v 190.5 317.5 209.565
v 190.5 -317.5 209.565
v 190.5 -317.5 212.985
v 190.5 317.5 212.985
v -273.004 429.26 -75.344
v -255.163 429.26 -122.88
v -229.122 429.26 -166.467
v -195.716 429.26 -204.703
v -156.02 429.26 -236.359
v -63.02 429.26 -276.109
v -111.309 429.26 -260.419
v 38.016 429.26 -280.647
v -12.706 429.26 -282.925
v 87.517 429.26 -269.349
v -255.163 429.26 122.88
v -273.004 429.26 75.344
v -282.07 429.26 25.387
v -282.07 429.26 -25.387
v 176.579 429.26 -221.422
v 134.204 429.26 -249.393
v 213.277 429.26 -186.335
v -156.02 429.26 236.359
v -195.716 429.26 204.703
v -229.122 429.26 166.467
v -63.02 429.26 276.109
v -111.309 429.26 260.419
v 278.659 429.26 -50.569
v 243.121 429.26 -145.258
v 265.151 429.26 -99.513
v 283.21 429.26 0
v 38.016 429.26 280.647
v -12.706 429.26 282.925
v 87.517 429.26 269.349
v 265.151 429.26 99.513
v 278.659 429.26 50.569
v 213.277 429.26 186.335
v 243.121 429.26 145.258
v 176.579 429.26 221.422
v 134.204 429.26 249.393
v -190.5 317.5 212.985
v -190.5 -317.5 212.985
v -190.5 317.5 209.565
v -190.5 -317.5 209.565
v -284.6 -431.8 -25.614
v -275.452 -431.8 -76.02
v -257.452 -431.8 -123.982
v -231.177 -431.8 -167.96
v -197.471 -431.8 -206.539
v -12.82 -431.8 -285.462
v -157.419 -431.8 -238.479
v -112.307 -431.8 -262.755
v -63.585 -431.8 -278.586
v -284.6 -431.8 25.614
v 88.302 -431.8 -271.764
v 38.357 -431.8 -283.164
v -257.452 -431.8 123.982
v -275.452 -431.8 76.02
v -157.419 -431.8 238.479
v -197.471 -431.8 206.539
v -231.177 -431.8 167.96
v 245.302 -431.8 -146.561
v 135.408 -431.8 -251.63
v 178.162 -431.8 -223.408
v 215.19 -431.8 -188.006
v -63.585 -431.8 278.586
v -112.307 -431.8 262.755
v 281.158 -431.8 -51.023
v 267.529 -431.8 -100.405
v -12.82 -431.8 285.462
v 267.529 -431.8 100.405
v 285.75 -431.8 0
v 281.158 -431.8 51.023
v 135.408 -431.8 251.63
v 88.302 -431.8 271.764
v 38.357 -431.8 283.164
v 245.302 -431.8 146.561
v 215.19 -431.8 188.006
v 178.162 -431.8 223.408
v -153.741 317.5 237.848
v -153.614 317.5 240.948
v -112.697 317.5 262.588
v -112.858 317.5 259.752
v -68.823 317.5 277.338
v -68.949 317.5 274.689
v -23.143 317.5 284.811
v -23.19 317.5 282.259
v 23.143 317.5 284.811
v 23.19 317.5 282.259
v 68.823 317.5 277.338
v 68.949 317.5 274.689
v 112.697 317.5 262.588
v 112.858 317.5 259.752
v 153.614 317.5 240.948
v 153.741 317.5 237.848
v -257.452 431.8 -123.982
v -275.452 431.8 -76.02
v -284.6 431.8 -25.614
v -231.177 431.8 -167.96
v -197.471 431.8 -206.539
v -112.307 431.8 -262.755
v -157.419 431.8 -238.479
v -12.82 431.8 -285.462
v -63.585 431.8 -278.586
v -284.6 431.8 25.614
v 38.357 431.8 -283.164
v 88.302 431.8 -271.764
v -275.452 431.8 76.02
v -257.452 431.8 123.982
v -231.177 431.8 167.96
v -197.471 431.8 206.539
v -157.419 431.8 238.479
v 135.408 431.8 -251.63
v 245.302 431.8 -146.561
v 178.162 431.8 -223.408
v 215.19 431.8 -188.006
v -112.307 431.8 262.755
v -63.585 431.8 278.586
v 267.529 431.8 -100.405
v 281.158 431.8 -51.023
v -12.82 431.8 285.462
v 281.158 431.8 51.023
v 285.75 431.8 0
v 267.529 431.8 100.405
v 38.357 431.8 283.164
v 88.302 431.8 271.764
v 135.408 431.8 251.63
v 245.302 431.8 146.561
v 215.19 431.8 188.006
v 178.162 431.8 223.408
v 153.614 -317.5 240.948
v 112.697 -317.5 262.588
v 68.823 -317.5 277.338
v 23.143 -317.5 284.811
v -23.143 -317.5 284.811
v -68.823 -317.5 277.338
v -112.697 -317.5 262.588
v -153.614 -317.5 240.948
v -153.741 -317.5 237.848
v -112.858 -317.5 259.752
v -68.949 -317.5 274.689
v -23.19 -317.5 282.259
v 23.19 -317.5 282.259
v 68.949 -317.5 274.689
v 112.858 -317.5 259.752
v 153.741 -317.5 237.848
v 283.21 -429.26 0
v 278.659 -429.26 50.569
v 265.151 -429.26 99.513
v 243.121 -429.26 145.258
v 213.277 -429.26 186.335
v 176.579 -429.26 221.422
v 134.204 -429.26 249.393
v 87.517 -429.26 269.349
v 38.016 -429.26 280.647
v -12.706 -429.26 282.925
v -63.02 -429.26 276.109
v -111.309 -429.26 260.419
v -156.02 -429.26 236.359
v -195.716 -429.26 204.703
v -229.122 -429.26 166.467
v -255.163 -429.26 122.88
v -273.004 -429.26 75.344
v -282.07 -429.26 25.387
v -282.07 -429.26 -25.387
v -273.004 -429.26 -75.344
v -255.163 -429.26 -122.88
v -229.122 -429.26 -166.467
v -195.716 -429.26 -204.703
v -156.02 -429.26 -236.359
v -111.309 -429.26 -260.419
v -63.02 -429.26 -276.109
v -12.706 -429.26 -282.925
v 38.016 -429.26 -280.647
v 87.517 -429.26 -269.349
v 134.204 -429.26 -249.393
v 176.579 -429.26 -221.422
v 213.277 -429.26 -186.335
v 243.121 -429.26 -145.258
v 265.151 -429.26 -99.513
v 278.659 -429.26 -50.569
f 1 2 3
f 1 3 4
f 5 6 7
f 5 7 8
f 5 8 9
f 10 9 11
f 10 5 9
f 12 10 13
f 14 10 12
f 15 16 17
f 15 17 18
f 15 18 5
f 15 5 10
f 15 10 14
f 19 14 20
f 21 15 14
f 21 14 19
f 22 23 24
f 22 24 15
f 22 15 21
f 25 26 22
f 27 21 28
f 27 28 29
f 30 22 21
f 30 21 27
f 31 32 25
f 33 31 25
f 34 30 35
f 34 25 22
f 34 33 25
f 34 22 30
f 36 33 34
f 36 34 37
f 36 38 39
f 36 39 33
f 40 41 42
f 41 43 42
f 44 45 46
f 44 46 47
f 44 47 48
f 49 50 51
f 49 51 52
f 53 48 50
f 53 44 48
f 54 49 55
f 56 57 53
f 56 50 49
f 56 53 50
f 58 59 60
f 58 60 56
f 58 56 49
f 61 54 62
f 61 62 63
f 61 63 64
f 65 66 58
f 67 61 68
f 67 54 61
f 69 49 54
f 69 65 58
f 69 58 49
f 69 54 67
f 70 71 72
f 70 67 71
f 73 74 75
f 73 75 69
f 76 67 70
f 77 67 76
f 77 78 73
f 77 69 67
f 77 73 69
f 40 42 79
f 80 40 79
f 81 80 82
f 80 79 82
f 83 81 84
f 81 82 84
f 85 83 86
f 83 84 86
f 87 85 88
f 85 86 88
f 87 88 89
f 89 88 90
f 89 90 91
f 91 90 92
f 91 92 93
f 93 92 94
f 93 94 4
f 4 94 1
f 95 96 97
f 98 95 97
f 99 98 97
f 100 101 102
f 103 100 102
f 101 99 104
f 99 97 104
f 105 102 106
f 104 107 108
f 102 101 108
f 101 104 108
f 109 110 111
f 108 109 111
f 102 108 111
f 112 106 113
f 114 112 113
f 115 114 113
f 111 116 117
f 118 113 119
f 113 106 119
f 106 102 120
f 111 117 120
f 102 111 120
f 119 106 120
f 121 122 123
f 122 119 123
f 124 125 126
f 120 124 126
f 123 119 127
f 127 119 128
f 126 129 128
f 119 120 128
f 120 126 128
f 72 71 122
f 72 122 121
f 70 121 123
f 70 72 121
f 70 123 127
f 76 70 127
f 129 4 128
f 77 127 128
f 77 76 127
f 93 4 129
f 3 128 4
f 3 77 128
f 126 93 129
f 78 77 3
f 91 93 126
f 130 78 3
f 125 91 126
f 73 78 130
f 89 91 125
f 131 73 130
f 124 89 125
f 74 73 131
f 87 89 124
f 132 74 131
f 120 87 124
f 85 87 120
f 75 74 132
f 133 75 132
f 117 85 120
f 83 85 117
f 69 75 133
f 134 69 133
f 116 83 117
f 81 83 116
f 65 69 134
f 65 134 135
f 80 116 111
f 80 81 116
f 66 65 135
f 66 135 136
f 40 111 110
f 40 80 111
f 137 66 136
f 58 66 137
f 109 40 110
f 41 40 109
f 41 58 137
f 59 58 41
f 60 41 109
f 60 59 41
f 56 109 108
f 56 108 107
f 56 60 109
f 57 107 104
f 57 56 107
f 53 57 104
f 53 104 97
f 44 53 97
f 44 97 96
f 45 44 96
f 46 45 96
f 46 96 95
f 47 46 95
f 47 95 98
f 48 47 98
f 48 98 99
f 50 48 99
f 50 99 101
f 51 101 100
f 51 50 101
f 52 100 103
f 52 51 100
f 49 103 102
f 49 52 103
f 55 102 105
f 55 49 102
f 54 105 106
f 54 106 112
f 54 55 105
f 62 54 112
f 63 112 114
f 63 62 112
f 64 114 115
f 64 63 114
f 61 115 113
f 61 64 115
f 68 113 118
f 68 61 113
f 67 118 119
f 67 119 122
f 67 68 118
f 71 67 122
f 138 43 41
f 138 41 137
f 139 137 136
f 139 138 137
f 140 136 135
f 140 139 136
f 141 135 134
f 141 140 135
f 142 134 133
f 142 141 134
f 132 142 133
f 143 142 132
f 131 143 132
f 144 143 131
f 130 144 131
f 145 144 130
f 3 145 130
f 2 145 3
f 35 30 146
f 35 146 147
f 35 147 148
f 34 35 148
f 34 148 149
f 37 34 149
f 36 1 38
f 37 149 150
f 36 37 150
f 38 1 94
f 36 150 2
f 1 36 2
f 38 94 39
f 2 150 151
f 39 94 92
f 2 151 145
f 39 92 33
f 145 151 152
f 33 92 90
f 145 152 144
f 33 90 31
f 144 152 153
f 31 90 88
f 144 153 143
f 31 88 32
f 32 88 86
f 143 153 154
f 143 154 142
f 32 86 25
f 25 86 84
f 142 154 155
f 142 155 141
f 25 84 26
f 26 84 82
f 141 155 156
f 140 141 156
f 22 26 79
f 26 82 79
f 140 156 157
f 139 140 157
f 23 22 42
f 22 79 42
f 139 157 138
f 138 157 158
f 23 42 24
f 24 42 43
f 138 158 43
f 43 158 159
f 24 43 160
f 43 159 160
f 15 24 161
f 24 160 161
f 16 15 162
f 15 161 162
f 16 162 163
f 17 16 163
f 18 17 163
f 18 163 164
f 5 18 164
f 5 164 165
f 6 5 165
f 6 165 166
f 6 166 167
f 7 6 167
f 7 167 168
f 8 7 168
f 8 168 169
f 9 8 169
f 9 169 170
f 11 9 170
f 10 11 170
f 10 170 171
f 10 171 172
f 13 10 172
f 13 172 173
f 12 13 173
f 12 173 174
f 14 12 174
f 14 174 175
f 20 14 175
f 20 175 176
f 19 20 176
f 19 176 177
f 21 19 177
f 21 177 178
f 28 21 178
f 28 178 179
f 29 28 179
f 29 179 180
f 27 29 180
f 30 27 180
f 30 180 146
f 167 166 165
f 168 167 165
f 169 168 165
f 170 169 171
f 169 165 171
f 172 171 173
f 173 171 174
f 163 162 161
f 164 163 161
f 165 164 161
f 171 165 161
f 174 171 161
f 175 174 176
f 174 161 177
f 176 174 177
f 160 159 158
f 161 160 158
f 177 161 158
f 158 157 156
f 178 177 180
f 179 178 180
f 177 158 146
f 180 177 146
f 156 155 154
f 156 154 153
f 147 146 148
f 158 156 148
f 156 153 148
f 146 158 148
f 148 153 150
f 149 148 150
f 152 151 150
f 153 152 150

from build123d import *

# Parameters (mm, degrees)
F0_R     = 285.75
F1_DEPTH = 431.8
F2_W     = 381
F2_H     = 635
F3_DEPTH = 452.12
F4_T     = -2.54


with BuildPart() as f1:
    # F0 (on Front) → F1 (new body, symmetric)
    with BuildSketch(Plane.XZ):
        Circle(F0_R)
    extrude(amount=F1_DEPTH, both=True)

    # F2 (on Top) → F3 (cut)
    with BuildSketch(Plane.XY):
        Rectangle(F2_W, F2_H)
    extrude(amount=F3_DEPTH, mode=Mode.SUBTRACT)

    # F4
    f4_openings = [f1.faces().sort_by_distance(p)[0] for p in [
        (0, 317.5, 132.295443),
        (-190.5, 0, 106.492737),
        (0, 0, 0),
        (0, -317.5, 132.295443),
        (190.5, 0, 106.492737),
    ]]
    offset(amount=F4_T, openings=f4_openings)


solid = f1.part
